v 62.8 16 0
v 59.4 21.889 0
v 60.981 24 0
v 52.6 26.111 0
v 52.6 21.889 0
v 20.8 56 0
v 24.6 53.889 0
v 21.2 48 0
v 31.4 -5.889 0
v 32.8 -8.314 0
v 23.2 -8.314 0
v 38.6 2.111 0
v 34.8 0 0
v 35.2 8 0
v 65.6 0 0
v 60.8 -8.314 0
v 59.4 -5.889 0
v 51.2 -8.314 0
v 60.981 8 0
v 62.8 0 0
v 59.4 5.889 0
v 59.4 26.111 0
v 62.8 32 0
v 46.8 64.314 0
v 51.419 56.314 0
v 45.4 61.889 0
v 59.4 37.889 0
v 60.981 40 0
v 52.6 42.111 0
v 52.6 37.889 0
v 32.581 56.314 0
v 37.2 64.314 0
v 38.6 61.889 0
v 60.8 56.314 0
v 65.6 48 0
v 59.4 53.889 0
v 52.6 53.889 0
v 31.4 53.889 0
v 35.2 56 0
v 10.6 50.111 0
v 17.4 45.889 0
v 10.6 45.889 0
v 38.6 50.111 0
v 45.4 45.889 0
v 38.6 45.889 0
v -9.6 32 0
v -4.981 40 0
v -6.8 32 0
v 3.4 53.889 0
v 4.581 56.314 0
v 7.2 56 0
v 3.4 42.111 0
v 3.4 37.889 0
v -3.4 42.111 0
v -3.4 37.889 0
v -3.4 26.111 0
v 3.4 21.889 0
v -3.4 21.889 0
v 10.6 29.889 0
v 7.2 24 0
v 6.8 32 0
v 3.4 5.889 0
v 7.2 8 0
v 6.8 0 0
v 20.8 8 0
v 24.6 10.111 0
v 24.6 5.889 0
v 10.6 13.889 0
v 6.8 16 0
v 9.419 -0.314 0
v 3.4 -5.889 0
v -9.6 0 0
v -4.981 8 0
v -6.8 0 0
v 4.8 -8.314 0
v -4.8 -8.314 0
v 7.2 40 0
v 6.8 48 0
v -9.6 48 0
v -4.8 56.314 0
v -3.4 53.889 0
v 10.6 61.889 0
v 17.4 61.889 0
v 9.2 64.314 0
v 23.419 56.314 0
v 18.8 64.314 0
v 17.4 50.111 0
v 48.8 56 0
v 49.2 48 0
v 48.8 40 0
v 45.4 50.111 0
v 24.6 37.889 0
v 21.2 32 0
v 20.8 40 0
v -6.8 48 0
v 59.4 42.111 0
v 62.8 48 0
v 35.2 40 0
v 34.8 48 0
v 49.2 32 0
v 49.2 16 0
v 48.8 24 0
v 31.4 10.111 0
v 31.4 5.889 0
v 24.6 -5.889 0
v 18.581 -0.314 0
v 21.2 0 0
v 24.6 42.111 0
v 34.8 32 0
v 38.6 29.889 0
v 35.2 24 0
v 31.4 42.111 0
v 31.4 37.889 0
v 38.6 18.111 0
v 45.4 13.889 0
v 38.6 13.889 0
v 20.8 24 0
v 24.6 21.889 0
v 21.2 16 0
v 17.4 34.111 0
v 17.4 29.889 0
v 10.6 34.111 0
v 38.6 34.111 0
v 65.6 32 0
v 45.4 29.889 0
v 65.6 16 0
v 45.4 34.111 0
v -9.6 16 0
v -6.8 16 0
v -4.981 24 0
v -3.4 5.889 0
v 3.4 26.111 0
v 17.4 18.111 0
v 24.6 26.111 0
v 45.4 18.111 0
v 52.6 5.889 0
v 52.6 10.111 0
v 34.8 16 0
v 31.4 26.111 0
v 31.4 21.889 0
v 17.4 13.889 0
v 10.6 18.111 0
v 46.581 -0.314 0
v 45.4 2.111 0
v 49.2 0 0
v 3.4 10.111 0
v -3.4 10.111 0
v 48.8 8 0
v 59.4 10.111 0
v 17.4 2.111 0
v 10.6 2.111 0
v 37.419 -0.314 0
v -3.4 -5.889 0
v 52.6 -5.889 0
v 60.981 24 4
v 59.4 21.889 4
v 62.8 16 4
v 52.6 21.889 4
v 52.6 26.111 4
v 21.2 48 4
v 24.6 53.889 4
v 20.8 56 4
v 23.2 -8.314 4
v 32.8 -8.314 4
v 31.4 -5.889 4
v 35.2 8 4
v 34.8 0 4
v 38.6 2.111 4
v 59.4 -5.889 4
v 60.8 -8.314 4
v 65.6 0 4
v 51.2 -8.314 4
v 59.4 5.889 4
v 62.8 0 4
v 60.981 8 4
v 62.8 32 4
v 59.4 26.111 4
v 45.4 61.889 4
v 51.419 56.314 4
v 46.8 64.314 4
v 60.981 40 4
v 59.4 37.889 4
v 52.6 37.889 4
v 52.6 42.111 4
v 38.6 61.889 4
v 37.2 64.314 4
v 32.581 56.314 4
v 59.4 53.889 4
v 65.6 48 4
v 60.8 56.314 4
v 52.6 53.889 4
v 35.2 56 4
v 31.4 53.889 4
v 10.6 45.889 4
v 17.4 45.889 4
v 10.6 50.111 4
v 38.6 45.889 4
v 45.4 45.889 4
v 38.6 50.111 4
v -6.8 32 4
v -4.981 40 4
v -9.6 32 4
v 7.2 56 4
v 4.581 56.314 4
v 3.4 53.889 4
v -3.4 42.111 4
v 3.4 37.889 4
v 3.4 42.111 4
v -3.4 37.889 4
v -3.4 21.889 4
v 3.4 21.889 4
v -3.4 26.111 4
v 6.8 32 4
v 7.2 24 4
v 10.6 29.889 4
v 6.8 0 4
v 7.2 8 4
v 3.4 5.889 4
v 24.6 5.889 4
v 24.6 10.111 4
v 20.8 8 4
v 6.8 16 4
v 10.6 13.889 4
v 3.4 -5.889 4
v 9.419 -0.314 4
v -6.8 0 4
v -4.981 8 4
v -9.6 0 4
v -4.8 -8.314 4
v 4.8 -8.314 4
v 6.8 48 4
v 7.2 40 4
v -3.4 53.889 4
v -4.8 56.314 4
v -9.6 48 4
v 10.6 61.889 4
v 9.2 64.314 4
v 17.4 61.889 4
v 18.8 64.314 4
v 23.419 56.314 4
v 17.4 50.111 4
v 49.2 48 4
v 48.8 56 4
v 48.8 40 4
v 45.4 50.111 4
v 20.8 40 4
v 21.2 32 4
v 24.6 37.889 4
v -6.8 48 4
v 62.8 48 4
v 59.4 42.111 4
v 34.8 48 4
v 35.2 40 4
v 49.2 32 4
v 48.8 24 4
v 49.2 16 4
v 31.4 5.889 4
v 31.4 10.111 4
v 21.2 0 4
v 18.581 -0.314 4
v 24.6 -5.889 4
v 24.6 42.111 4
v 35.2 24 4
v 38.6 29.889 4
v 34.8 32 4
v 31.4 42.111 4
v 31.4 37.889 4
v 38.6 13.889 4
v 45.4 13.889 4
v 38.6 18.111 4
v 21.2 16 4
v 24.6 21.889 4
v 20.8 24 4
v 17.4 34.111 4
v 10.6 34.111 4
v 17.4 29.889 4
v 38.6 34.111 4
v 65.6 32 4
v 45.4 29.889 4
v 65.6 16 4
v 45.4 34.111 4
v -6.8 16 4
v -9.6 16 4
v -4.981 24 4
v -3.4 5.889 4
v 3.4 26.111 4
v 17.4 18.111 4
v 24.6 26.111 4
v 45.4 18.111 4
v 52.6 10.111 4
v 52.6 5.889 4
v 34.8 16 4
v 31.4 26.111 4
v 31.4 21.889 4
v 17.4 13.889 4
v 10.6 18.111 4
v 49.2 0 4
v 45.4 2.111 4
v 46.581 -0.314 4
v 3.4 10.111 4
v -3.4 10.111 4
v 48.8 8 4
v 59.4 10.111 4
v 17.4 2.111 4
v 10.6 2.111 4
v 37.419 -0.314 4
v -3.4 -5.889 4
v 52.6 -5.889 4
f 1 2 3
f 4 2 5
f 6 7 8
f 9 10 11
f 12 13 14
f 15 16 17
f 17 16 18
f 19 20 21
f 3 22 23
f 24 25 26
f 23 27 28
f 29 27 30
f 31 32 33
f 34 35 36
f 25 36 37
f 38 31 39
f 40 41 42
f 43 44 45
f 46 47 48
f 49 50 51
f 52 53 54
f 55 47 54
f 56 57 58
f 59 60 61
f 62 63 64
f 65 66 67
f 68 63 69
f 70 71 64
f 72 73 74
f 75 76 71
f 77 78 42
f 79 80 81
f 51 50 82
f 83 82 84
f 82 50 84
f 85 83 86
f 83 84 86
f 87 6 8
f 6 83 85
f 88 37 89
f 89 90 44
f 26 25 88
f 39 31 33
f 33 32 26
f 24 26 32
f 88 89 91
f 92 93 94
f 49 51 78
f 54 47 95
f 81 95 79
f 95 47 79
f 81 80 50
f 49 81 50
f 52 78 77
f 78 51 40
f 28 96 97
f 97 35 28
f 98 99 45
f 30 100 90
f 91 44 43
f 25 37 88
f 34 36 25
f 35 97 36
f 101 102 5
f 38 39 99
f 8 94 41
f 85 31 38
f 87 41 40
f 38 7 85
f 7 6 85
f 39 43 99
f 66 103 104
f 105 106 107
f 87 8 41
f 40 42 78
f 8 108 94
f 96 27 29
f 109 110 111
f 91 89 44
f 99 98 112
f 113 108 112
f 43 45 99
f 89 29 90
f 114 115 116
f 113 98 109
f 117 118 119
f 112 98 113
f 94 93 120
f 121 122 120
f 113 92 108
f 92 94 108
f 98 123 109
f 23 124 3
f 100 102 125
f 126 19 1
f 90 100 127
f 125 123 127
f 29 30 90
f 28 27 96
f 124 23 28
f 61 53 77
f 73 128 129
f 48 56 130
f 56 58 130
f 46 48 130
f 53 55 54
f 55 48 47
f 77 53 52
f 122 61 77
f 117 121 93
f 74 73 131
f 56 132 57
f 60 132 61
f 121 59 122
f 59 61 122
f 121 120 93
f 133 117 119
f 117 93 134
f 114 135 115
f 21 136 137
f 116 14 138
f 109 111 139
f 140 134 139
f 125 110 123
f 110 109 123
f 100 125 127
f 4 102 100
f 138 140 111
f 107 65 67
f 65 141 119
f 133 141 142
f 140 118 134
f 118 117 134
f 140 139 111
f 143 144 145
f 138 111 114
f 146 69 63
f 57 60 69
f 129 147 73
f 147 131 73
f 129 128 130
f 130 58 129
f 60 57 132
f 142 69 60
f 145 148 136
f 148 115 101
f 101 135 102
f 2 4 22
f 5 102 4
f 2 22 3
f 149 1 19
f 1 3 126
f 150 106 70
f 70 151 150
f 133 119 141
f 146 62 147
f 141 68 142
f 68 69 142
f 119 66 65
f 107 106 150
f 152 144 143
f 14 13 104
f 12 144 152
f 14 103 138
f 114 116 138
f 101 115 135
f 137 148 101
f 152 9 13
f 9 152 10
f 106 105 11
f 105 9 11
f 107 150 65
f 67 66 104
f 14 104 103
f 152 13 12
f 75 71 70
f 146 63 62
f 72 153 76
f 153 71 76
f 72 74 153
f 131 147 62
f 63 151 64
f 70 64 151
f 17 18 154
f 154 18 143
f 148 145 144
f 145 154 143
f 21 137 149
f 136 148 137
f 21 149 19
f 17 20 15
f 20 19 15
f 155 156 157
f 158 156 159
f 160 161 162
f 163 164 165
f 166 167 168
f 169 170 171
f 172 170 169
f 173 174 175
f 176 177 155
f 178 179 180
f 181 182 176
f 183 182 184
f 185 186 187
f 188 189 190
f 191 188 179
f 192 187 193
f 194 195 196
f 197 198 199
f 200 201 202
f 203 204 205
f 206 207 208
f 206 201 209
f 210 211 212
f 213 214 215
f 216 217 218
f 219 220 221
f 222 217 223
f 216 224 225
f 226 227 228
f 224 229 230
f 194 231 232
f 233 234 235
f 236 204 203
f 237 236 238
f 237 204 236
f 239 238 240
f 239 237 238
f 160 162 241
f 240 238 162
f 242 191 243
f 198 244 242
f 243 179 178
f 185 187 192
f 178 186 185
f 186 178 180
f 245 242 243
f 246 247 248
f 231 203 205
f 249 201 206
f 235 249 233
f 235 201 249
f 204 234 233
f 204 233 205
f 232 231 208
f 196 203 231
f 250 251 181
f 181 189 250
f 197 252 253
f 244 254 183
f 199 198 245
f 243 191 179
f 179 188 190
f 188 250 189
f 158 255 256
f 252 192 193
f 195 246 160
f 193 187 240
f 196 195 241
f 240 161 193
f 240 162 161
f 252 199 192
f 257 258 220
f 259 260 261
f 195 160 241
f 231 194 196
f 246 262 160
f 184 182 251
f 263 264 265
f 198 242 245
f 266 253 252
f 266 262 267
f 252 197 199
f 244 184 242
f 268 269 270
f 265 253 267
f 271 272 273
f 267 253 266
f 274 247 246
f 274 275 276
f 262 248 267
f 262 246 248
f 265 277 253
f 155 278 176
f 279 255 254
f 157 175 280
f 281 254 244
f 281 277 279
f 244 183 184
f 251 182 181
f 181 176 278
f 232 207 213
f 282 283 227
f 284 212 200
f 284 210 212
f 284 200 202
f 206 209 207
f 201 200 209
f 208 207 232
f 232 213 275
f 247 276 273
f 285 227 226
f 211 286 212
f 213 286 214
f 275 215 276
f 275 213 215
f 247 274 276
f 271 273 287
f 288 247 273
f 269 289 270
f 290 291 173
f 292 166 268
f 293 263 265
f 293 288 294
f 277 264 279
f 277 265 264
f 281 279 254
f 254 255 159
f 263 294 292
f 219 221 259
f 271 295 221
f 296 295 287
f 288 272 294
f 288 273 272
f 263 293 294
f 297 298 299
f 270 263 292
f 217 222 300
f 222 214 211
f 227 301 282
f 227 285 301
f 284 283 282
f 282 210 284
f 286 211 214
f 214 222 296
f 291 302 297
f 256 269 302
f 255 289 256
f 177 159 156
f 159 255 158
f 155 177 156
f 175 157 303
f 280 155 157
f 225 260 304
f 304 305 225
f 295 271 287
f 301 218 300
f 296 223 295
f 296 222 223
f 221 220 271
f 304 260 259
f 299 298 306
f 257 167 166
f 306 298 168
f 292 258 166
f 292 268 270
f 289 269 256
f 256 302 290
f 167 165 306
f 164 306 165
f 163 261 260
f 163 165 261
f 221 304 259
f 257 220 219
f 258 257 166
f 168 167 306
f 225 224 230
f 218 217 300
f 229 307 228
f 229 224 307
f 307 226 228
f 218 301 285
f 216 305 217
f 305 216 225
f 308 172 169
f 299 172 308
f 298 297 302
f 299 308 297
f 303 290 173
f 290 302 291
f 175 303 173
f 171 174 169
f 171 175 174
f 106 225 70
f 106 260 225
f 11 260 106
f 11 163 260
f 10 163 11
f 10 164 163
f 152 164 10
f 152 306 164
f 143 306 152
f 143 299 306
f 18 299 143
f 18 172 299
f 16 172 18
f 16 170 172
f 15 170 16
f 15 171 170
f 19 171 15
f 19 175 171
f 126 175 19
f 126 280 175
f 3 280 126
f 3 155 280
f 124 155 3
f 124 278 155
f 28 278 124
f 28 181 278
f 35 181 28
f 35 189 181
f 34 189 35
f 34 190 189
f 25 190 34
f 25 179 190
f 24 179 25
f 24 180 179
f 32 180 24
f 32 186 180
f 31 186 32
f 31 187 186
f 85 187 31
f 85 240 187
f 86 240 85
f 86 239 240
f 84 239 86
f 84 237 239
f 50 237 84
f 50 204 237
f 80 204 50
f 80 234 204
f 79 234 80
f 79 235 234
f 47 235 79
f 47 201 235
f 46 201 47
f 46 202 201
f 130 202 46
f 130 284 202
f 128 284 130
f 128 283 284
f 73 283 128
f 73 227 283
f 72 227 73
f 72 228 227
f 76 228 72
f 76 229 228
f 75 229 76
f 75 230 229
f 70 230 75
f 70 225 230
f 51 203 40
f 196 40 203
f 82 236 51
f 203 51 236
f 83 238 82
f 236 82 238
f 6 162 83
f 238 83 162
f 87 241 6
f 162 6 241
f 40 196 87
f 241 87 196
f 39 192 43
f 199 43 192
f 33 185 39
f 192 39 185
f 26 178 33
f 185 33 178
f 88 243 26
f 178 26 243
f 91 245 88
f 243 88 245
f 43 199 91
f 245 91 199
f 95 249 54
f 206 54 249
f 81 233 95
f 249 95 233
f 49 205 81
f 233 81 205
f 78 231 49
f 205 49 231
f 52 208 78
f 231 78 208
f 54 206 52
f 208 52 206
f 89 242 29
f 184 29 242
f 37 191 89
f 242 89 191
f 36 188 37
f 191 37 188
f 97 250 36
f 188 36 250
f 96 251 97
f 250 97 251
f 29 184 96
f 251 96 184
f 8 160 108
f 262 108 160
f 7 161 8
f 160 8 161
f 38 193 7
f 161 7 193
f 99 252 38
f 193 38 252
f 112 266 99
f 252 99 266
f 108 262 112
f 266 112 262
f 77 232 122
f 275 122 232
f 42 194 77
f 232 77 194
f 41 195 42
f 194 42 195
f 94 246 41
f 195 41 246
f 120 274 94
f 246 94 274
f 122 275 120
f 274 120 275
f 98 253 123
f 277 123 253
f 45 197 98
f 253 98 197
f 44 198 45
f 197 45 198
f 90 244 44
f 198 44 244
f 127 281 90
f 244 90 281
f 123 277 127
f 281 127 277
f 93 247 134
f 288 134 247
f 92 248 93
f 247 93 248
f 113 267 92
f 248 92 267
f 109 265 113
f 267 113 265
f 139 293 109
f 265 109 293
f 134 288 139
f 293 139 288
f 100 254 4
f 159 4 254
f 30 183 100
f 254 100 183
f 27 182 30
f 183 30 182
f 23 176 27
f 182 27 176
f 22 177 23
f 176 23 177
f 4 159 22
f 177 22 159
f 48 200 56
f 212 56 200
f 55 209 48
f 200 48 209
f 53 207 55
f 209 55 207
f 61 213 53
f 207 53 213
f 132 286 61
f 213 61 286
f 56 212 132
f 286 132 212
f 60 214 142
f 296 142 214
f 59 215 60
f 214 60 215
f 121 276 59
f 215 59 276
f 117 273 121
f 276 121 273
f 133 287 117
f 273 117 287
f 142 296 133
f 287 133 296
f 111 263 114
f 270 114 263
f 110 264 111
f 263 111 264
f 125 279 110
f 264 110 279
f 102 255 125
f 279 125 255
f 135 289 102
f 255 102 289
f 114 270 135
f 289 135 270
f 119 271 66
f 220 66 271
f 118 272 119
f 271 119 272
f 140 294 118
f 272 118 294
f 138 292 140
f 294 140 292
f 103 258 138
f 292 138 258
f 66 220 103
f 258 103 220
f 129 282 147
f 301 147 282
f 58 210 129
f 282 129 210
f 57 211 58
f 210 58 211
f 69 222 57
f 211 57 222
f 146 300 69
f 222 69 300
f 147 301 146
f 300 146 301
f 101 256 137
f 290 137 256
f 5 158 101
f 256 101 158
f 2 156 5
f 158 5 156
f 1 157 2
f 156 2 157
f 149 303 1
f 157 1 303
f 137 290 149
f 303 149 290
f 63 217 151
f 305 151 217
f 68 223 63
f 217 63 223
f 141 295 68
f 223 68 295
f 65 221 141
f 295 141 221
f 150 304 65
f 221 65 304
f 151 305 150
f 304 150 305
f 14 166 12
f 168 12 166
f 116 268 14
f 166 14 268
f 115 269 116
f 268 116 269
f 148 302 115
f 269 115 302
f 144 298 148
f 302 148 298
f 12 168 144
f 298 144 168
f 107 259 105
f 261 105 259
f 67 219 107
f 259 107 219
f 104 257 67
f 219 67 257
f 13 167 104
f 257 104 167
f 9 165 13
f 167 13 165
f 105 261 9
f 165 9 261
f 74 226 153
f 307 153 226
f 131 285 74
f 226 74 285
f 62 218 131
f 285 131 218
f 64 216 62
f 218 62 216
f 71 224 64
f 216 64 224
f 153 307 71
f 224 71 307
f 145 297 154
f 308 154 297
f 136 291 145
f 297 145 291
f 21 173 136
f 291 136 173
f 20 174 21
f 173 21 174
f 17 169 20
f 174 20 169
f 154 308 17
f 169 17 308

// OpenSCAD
// See https://gist.github.com/lorennorman/1534990

module hexagon(radius)
{
  circle(r=radius,$fn=6);
}
 
module shell(radius)
{
  difference()
  {
    hexagon(radius*1.2); // base
    scale([1, 1, 1.1]) hexagon(radius*0.85); // hole
  }
}
 
module piece(radius)
{
  translate([0, 0, -radius/12])
  {
    scale([1,1,0.5])
    {
      hexagon(radius);
    }
  }
}
 
module shell_with_piece(radius)
{
  shell(radius);
  piece(radius);
}
 
function column_to_offset(column, offset) = (column % 2) * offset;
 
module translate_to_hex(x_coord, y_coord, hex_width)
{
  translate([x_coord*hex_width*1.75, y_coord*hex_width*2+column_to_offset(x_coord, hex_width), 0])
  {
    child(0);
  }
}
 
module lattice(rows, columns, hex_width)
{
  for(x = [0:columns-1])
  {
    for(y = [0:rows-1])
    {
      translate_to_hex(x, y, hex_width)
      {
        shell(hex_width);
      }
    }
  }
}
 
linear_extrude(height=4)
{
  lattice(4, 5, 8);
 
  // translate_to_hex(2, 2, 4)
  // {
  //   piece(4);
  // }
}
